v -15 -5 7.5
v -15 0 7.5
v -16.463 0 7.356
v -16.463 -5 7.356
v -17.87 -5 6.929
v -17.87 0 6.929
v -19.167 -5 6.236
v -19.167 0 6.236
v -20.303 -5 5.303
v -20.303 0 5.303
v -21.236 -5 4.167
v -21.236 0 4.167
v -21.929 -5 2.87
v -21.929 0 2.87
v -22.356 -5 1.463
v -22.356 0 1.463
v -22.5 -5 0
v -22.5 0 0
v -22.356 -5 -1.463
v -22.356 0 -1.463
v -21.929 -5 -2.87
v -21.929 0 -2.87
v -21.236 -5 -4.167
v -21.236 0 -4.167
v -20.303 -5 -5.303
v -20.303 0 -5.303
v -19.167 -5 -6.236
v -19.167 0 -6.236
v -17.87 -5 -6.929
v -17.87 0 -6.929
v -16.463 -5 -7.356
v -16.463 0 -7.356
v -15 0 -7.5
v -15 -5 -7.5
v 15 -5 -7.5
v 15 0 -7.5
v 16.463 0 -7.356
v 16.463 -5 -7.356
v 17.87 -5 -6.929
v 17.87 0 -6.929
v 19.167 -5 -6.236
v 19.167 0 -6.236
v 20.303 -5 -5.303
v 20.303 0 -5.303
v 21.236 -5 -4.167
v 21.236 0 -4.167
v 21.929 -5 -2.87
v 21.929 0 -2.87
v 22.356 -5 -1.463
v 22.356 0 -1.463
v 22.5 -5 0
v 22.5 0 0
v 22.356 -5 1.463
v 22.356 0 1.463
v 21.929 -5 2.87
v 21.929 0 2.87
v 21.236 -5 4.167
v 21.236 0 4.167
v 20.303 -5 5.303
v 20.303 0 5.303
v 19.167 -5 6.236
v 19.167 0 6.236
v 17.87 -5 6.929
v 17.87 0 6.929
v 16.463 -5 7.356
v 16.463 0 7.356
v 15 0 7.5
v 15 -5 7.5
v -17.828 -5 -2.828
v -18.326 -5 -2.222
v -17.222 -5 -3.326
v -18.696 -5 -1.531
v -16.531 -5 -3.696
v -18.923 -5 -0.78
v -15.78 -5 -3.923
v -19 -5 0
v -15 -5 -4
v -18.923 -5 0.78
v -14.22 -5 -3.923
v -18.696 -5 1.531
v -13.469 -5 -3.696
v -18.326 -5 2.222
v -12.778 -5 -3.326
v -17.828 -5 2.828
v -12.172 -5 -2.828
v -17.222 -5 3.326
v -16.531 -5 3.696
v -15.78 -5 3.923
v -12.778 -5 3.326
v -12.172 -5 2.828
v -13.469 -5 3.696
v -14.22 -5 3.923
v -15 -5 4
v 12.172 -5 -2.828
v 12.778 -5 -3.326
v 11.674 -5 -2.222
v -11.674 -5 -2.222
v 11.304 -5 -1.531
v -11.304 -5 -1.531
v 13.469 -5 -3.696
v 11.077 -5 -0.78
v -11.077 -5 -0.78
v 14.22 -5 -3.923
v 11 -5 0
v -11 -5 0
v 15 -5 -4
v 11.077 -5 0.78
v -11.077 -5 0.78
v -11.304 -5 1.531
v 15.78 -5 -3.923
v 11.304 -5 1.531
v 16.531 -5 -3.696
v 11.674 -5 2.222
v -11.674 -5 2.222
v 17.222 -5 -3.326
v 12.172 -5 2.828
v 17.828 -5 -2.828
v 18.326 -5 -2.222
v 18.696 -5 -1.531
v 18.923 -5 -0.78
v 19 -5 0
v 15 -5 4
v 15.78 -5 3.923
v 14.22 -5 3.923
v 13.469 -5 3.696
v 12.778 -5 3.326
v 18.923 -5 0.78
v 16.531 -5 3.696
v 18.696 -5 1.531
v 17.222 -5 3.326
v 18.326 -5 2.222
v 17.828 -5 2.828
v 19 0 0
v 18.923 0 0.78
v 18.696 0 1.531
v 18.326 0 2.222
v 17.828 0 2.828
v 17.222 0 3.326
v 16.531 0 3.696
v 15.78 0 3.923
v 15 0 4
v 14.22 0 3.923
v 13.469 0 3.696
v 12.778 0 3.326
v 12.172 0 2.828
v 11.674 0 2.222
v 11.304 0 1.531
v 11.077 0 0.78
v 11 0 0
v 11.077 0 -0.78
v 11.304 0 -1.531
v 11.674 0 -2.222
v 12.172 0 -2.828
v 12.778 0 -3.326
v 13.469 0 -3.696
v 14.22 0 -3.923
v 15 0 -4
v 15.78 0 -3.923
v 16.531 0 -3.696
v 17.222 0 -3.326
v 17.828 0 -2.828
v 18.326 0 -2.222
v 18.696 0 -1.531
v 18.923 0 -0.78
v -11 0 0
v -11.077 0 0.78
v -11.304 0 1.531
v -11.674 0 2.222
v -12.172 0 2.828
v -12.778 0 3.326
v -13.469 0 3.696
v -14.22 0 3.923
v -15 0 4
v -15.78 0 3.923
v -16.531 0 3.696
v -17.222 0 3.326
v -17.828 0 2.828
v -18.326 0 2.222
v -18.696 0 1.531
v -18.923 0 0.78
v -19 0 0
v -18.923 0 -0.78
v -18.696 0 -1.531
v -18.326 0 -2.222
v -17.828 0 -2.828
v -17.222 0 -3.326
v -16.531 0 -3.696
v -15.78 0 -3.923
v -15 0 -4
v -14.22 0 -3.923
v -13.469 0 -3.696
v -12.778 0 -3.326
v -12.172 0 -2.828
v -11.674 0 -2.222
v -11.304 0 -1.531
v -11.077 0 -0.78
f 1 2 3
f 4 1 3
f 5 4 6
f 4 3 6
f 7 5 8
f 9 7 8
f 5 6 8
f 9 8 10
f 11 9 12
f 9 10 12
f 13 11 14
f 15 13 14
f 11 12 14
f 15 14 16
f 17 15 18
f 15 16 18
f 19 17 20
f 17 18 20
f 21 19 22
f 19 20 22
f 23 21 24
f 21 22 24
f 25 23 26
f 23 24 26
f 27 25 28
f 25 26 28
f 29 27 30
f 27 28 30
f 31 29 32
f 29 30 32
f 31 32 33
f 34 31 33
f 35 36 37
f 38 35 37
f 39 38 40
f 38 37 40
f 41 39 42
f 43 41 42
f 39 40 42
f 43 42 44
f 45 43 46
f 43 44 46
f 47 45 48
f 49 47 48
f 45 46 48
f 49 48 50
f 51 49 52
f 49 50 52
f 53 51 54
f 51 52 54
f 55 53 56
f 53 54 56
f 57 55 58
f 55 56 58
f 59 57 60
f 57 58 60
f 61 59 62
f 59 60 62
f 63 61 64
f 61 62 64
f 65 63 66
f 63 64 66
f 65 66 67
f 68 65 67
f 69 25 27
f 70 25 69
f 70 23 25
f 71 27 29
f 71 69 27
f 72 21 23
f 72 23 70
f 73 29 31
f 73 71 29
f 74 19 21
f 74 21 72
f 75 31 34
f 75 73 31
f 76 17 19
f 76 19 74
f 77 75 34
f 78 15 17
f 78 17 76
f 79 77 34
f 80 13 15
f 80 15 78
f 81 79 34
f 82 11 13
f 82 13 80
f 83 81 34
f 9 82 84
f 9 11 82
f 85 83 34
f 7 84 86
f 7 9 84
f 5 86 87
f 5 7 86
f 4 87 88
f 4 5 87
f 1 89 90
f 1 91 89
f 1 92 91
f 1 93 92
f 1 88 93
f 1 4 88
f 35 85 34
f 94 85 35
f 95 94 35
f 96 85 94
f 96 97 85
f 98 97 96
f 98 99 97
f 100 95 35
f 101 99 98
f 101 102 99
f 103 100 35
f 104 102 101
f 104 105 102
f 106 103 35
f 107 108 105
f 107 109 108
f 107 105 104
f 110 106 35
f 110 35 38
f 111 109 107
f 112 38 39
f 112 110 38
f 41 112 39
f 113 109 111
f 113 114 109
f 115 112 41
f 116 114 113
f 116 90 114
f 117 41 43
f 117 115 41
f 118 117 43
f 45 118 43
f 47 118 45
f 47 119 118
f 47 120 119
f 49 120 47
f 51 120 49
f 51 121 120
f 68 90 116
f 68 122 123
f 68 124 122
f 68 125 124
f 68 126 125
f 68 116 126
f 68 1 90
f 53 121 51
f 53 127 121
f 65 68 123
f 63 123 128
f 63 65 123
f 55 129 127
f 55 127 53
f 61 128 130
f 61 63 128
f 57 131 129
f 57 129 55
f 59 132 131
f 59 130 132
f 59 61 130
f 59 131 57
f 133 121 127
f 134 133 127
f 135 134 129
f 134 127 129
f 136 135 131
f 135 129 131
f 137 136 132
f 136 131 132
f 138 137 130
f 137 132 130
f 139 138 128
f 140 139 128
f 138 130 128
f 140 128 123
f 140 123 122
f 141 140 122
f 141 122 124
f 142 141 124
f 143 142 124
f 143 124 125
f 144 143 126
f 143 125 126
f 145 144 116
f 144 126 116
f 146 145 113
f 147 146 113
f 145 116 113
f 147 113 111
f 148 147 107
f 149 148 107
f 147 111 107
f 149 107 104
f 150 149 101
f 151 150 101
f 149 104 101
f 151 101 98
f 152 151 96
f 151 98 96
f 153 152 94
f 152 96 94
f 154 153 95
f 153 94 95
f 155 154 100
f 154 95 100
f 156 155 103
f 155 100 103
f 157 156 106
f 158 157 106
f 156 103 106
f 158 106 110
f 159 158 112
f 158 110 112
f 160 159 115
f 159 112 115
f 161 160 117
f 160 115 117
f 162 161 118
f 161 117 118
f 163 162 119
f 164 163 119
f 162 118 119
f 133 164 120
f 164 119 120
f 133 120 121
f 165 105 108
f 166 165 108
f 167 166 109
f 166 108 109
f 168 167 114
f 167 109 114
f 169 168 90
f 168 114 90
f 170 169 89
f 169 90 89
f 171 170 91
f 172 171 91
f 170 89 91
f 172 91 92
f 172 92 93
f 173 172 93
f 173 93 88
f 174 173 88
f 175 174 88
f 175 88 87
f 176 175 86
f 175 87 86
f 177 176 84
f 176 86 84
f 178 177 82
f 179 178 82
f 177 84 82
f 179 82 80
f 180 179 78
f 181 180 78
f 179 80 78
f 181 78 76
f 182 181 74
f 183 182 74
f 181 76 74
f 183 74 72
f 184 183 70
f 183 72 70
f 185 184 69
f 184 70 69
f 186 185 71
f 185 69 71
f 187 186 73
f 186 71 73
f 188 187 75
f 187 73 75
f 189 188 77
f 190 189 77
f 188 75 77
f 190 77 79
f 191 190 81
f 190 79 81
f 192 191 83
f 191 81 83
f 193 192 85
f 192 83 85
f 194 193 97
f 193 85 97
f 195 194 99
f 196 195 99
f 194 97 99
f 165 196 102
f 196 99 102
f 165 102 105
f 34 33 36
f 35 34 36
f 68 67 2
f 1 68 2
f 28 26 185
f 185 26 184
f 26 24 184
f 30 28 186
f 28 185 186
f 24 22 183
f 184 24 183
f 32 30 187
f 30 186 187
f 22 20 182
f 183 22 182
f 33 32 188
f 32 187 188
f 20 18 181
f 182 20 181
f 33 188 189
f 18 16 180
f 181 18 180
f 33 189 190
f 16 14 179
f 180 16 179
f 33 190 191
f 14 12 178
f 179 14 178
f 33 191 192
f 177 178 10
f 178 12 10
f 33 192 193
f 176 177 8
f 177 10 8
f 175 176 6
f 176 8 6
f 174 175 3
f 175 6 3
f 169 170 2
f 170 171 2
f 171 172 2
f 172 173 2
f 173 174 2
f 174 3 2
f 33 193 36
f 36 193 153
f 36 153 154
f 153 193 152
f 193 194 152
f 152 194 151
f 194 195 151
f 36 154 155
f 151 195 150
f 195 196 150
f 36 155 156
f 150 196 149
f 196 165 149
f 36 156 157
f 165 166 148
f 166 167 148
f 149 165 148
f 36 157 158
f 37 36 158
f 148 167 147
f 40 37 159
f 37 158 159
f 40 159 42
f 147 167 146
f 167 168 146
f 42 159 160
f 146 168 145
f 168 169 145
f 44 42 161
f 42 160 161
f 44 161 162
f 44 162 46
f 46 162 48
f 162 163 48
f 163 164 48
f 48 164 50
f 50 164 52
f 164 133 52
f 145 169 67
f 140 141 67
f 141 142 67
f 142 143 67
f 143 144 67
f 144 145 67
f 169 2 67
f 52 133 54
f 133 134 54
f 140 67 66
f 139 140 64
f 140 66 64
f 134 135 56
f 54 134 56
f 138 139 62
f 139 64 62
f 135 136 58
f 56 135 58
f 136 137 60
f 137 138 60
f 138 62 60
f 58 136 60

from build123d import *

# Parameters (mm, degrees)
F1_DEPTH = 5
F2_R     = 4
F3_DEPTH = 5


with BuildPart() as f1:
    # F0 (on Front) → F1 (new body)
    with BuildSketch(Plane.XZ):
        with BuildLine():
            Line((15, 7.5), (-15, 7.5))
            ThreePointArc((-15, 7.5), (-22.5, 0), (-15, -7.5))
            Line((-15, -7.5), (15, -7.5))
            ThreePointArc((15, -7.5), (22.5, 0), (15, 7.5))
        make_face()
    extrude(amount=F1_DEPTH)

    # F2 (on face) → F3 (cut)
    with BuildSketch(Plane.XZ.offset(5)):
        with Locations((-15, 0)):
            Circle(F2_R)
        with Locations((15, 0)):
            Circle(F2_R)
    extrude(amount=-F3_DEPTH, mode=Mode.SUBTRACT)


solid = f1.part
